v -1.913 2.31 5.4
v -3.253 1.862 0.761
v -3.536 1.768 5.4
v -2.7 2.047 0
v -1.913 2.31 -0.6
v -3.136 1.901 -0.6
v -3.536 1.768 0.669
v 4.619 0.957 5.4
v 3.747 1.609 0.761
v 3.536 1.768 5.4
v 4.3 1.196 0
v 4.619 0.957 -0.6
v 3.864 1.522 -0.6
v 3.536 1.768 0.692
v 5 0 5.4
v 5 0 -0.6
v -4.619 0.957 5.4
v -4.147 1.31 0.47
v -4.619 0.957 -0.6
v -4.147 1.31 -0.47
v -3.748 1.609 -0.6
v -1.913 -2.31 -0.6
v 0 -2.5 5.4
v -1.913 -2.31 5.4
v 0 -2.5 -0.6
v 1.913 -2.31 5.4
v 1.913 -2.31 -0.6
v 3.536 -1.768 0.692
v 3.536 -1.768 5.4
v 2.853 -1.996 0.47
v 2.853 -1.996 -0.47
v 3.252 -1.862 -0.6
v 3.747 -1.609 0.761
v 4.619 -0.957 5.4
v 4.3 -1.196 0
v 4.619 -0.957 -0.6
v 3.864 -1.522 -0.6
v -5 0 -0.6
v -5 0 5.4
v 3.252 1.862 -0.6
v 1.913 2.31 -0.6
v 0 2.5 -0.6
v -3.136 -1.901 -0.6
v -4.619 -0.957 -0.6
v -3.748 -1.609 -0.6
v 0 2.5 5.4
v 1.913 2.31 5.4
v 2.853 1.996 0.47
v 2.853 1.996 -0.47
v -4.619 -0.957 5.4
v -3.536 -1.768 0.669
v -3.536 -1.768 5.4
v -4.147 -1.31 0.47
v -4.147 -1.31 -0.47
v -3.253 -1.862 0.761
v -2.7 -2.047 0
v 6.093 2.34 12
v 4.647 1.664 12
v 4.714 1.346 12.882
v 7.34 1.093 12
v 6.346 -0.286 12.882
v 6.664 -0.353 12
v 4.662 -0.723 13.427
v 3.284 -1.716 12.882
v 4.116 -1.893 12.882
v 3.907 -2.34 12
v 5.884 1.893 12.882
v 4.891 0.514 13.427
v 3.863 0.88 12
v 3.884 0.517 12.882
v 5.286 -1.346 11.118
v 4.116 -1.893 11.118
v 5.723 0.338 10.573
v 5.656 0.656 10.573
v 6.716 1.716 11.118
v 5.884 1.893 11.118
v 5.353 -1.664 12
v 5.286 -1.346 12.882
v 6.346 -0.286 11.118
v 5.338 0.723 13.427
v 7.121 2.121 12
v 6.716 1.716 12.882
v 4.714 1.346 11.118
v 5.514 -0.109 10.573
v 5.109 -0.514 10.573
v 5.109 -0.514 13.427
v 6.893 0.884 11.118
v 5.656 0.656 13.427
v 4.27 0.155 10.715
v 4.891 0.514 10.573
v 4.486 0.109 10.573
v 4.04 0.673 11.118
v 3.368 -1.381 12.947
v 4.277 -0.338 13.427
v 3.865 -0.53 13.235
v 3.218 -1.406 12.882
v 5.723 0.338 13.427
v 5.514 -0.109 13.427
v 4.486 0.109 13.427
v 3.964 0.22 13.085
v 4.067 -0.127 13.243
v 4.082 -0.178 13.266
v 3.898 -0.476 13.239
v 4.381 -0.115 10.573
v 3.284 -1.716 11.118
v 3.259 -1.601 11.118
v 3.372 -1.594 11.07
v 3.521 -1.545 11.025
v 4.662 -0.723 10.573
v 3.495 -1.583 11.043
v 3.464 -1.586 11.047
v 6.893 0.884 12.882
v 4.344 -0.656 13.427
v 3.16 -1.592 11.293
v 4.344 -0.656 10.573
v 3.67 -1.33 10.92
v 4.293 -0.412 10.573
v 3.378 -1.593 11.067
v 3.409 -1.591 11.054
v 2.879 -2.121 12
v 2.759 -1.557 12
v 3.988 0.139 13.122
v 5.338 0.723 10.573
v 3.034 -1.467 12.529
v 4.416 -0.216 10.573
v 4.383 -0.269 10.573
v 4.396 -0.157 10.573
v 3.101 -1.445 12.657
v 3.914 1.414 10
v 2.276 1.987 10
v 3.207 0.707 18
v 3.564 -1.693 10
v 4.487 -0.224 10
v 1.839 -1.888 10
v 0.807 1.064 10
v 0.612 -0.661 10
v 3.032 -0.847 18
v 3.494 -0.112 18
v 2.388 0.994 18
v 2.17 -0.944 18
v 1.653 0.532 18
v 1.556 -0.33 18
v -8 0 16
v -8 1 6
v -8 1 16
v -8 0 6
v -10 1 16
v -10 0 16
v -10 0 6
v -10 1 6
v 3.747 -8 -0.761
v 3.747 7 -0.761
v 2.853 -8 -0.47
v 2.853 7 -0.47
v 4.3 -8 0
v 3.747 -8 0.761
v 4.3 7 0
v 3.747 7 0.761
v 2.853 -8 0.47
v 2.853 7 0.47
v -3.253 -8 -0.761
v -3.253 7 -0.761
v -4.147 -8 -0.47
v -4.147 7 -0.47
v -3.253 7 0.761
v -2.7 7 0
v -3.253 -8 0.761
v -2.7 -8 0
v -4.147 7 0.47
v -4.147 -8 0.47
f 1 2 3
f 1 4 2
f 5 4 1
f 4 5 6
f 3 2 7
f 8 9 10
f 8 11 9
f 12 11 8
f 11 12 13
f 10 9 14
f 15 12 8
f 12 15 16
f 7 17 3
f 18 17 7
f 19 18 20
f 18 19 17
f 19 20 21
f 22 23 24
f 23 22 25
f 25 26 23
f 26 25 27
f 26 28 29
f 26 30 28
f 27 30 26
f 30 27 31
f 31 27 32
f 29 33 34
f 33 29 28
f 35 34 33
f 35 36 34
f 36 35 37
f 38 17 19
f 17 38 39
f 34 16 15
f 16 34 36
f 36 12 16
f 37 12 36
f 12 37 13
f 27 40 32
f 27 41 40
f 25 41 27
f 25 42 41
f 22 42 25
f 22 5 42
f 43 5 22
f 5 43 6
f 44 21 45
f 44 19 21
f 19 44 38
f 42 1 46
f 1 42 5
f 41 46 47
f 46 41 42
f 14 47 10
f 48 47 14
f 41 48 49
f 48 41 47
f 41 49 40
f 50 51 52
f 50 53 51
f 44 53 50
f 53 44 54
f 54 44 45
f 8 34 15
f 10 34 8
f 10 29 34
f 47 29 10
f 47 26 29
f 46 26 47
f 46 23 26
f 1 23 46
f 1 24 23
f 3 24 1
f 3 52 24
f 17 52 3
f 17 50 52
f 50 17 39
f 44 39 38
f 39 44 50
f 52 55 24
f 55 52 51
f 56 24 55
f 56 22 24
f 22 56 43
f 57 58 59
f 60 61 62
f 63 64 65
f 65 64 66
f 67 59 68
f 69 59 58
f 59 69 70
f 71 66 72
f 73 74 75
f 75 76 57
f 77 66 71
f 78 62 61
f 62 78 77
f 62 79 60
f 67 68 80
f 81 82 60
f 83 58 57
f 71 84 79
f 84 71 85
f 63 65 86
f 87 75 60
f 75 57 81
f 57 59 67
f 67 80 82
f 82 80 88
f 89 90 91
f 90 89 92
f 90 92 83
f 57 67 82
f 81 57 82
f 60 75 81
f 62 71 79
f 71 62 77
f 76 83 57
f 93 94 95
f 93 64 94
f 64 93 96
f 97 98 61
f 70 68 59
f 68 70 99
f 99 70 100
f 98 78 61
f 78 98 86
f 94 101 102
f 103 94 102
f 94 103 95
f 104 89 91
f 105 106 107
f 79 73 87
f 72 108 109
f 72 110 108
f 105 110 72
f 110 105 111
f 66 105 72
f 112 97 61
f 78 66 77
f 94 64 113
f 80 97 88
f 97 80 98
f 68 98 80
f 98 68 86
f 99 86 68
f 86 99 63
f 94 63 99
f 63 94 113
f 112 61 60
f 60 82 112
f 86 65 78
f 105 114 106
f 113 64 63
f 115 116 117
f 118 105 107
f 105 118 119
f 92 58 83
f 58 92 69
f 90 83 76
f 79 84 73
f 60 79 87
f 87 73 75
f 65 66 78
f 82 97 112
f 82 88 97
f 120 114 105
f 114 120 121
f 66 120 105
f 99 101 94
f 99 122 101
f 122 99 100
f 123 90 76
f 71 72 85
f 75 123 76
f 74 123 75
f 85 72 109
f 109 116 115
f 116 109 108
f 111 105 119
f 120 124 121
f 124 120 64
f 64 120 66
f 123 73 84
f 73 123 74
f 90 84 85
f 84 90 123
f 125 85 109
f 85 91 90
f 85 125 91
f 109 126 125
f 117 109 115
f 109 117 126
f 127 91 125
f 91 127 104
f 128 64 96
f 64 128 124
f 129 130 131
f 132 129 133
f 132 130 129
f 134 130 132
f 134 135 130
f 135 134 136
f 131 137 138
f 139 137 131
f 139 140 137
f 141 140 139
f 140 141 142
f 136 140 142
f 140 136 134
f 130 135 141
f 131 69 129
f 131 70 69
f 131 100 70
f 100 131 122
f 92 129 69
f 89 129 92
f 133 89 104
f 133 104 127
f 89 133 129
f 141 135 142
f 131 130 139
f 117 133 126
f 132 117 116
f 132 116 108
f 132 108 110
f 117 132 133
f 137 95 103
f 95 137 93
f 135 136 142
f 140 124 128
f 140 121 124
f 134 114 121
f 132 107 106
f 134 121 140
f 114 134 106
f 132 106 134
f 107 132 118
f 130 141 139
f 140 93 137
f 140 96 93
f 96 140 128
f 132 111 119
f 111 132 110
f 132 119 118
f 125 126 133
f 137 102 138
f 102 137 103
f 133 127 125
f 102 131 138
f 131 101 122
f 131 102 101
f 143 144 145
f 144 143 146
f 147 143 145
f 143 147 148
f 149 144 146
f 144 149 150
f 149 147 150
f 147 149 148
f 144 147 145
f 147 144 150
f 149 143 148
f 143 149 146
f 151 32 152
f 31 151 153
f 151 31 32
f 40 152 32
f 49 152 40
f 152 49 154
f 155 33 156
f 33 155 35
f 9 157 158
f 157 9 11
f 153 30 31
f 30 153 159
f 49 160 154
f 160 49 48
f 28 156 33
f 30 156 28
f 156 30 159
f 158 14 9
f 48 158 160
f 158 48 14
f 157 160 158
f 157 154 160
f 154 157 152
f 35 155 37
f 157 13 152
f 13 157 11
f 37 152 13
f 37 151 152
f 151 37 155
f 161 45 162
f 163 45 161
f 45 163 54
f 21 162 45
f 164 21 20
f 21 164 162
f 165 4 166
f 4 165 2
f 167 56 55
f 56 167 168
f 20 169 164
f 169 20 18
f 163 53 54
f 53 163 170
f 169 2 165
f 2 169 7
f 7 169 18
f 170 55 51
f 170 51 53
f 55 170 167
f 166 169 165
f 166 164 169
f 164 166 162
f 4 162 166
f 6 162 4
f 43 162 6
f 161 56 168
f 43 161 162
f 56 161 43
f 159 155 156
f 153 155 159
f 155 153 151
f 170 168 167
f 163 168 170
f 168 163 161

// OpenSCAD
// Simple Horse Model
module horse() {
    // Body
    scale([1, 0.5, 0.3])
        translate([0, 0, 8])
        cylinder(h = 20, r = 5, center = true);

    // Head
    translate([5, 0, 12])
        rotate([0, 0, 45])
        scale([1, 0.5, 0.5])
        sphere(r = 3);
    
    // Neck
    translate([2.5, 0, 10])
        rotate([0, 0, 45])
        cylinder(h = 8, r1 = 2, r2 = 1, center = false);

    // Tail
    translate([-10, 0, 6])
        cube([2, 1, 10]);

    // Legs
    leg([3.5, 2, 0]);
    leg([-3.5, 2, 0]);
    leg([3.5, -3, 0]);
    leg([-3.5, -3, 0]);

}

module leg(position) {
    translate(position)
        rotate([90, 0, 0])
        cylinder(h = 10, r = 0.8, center = true);
}

horse();
